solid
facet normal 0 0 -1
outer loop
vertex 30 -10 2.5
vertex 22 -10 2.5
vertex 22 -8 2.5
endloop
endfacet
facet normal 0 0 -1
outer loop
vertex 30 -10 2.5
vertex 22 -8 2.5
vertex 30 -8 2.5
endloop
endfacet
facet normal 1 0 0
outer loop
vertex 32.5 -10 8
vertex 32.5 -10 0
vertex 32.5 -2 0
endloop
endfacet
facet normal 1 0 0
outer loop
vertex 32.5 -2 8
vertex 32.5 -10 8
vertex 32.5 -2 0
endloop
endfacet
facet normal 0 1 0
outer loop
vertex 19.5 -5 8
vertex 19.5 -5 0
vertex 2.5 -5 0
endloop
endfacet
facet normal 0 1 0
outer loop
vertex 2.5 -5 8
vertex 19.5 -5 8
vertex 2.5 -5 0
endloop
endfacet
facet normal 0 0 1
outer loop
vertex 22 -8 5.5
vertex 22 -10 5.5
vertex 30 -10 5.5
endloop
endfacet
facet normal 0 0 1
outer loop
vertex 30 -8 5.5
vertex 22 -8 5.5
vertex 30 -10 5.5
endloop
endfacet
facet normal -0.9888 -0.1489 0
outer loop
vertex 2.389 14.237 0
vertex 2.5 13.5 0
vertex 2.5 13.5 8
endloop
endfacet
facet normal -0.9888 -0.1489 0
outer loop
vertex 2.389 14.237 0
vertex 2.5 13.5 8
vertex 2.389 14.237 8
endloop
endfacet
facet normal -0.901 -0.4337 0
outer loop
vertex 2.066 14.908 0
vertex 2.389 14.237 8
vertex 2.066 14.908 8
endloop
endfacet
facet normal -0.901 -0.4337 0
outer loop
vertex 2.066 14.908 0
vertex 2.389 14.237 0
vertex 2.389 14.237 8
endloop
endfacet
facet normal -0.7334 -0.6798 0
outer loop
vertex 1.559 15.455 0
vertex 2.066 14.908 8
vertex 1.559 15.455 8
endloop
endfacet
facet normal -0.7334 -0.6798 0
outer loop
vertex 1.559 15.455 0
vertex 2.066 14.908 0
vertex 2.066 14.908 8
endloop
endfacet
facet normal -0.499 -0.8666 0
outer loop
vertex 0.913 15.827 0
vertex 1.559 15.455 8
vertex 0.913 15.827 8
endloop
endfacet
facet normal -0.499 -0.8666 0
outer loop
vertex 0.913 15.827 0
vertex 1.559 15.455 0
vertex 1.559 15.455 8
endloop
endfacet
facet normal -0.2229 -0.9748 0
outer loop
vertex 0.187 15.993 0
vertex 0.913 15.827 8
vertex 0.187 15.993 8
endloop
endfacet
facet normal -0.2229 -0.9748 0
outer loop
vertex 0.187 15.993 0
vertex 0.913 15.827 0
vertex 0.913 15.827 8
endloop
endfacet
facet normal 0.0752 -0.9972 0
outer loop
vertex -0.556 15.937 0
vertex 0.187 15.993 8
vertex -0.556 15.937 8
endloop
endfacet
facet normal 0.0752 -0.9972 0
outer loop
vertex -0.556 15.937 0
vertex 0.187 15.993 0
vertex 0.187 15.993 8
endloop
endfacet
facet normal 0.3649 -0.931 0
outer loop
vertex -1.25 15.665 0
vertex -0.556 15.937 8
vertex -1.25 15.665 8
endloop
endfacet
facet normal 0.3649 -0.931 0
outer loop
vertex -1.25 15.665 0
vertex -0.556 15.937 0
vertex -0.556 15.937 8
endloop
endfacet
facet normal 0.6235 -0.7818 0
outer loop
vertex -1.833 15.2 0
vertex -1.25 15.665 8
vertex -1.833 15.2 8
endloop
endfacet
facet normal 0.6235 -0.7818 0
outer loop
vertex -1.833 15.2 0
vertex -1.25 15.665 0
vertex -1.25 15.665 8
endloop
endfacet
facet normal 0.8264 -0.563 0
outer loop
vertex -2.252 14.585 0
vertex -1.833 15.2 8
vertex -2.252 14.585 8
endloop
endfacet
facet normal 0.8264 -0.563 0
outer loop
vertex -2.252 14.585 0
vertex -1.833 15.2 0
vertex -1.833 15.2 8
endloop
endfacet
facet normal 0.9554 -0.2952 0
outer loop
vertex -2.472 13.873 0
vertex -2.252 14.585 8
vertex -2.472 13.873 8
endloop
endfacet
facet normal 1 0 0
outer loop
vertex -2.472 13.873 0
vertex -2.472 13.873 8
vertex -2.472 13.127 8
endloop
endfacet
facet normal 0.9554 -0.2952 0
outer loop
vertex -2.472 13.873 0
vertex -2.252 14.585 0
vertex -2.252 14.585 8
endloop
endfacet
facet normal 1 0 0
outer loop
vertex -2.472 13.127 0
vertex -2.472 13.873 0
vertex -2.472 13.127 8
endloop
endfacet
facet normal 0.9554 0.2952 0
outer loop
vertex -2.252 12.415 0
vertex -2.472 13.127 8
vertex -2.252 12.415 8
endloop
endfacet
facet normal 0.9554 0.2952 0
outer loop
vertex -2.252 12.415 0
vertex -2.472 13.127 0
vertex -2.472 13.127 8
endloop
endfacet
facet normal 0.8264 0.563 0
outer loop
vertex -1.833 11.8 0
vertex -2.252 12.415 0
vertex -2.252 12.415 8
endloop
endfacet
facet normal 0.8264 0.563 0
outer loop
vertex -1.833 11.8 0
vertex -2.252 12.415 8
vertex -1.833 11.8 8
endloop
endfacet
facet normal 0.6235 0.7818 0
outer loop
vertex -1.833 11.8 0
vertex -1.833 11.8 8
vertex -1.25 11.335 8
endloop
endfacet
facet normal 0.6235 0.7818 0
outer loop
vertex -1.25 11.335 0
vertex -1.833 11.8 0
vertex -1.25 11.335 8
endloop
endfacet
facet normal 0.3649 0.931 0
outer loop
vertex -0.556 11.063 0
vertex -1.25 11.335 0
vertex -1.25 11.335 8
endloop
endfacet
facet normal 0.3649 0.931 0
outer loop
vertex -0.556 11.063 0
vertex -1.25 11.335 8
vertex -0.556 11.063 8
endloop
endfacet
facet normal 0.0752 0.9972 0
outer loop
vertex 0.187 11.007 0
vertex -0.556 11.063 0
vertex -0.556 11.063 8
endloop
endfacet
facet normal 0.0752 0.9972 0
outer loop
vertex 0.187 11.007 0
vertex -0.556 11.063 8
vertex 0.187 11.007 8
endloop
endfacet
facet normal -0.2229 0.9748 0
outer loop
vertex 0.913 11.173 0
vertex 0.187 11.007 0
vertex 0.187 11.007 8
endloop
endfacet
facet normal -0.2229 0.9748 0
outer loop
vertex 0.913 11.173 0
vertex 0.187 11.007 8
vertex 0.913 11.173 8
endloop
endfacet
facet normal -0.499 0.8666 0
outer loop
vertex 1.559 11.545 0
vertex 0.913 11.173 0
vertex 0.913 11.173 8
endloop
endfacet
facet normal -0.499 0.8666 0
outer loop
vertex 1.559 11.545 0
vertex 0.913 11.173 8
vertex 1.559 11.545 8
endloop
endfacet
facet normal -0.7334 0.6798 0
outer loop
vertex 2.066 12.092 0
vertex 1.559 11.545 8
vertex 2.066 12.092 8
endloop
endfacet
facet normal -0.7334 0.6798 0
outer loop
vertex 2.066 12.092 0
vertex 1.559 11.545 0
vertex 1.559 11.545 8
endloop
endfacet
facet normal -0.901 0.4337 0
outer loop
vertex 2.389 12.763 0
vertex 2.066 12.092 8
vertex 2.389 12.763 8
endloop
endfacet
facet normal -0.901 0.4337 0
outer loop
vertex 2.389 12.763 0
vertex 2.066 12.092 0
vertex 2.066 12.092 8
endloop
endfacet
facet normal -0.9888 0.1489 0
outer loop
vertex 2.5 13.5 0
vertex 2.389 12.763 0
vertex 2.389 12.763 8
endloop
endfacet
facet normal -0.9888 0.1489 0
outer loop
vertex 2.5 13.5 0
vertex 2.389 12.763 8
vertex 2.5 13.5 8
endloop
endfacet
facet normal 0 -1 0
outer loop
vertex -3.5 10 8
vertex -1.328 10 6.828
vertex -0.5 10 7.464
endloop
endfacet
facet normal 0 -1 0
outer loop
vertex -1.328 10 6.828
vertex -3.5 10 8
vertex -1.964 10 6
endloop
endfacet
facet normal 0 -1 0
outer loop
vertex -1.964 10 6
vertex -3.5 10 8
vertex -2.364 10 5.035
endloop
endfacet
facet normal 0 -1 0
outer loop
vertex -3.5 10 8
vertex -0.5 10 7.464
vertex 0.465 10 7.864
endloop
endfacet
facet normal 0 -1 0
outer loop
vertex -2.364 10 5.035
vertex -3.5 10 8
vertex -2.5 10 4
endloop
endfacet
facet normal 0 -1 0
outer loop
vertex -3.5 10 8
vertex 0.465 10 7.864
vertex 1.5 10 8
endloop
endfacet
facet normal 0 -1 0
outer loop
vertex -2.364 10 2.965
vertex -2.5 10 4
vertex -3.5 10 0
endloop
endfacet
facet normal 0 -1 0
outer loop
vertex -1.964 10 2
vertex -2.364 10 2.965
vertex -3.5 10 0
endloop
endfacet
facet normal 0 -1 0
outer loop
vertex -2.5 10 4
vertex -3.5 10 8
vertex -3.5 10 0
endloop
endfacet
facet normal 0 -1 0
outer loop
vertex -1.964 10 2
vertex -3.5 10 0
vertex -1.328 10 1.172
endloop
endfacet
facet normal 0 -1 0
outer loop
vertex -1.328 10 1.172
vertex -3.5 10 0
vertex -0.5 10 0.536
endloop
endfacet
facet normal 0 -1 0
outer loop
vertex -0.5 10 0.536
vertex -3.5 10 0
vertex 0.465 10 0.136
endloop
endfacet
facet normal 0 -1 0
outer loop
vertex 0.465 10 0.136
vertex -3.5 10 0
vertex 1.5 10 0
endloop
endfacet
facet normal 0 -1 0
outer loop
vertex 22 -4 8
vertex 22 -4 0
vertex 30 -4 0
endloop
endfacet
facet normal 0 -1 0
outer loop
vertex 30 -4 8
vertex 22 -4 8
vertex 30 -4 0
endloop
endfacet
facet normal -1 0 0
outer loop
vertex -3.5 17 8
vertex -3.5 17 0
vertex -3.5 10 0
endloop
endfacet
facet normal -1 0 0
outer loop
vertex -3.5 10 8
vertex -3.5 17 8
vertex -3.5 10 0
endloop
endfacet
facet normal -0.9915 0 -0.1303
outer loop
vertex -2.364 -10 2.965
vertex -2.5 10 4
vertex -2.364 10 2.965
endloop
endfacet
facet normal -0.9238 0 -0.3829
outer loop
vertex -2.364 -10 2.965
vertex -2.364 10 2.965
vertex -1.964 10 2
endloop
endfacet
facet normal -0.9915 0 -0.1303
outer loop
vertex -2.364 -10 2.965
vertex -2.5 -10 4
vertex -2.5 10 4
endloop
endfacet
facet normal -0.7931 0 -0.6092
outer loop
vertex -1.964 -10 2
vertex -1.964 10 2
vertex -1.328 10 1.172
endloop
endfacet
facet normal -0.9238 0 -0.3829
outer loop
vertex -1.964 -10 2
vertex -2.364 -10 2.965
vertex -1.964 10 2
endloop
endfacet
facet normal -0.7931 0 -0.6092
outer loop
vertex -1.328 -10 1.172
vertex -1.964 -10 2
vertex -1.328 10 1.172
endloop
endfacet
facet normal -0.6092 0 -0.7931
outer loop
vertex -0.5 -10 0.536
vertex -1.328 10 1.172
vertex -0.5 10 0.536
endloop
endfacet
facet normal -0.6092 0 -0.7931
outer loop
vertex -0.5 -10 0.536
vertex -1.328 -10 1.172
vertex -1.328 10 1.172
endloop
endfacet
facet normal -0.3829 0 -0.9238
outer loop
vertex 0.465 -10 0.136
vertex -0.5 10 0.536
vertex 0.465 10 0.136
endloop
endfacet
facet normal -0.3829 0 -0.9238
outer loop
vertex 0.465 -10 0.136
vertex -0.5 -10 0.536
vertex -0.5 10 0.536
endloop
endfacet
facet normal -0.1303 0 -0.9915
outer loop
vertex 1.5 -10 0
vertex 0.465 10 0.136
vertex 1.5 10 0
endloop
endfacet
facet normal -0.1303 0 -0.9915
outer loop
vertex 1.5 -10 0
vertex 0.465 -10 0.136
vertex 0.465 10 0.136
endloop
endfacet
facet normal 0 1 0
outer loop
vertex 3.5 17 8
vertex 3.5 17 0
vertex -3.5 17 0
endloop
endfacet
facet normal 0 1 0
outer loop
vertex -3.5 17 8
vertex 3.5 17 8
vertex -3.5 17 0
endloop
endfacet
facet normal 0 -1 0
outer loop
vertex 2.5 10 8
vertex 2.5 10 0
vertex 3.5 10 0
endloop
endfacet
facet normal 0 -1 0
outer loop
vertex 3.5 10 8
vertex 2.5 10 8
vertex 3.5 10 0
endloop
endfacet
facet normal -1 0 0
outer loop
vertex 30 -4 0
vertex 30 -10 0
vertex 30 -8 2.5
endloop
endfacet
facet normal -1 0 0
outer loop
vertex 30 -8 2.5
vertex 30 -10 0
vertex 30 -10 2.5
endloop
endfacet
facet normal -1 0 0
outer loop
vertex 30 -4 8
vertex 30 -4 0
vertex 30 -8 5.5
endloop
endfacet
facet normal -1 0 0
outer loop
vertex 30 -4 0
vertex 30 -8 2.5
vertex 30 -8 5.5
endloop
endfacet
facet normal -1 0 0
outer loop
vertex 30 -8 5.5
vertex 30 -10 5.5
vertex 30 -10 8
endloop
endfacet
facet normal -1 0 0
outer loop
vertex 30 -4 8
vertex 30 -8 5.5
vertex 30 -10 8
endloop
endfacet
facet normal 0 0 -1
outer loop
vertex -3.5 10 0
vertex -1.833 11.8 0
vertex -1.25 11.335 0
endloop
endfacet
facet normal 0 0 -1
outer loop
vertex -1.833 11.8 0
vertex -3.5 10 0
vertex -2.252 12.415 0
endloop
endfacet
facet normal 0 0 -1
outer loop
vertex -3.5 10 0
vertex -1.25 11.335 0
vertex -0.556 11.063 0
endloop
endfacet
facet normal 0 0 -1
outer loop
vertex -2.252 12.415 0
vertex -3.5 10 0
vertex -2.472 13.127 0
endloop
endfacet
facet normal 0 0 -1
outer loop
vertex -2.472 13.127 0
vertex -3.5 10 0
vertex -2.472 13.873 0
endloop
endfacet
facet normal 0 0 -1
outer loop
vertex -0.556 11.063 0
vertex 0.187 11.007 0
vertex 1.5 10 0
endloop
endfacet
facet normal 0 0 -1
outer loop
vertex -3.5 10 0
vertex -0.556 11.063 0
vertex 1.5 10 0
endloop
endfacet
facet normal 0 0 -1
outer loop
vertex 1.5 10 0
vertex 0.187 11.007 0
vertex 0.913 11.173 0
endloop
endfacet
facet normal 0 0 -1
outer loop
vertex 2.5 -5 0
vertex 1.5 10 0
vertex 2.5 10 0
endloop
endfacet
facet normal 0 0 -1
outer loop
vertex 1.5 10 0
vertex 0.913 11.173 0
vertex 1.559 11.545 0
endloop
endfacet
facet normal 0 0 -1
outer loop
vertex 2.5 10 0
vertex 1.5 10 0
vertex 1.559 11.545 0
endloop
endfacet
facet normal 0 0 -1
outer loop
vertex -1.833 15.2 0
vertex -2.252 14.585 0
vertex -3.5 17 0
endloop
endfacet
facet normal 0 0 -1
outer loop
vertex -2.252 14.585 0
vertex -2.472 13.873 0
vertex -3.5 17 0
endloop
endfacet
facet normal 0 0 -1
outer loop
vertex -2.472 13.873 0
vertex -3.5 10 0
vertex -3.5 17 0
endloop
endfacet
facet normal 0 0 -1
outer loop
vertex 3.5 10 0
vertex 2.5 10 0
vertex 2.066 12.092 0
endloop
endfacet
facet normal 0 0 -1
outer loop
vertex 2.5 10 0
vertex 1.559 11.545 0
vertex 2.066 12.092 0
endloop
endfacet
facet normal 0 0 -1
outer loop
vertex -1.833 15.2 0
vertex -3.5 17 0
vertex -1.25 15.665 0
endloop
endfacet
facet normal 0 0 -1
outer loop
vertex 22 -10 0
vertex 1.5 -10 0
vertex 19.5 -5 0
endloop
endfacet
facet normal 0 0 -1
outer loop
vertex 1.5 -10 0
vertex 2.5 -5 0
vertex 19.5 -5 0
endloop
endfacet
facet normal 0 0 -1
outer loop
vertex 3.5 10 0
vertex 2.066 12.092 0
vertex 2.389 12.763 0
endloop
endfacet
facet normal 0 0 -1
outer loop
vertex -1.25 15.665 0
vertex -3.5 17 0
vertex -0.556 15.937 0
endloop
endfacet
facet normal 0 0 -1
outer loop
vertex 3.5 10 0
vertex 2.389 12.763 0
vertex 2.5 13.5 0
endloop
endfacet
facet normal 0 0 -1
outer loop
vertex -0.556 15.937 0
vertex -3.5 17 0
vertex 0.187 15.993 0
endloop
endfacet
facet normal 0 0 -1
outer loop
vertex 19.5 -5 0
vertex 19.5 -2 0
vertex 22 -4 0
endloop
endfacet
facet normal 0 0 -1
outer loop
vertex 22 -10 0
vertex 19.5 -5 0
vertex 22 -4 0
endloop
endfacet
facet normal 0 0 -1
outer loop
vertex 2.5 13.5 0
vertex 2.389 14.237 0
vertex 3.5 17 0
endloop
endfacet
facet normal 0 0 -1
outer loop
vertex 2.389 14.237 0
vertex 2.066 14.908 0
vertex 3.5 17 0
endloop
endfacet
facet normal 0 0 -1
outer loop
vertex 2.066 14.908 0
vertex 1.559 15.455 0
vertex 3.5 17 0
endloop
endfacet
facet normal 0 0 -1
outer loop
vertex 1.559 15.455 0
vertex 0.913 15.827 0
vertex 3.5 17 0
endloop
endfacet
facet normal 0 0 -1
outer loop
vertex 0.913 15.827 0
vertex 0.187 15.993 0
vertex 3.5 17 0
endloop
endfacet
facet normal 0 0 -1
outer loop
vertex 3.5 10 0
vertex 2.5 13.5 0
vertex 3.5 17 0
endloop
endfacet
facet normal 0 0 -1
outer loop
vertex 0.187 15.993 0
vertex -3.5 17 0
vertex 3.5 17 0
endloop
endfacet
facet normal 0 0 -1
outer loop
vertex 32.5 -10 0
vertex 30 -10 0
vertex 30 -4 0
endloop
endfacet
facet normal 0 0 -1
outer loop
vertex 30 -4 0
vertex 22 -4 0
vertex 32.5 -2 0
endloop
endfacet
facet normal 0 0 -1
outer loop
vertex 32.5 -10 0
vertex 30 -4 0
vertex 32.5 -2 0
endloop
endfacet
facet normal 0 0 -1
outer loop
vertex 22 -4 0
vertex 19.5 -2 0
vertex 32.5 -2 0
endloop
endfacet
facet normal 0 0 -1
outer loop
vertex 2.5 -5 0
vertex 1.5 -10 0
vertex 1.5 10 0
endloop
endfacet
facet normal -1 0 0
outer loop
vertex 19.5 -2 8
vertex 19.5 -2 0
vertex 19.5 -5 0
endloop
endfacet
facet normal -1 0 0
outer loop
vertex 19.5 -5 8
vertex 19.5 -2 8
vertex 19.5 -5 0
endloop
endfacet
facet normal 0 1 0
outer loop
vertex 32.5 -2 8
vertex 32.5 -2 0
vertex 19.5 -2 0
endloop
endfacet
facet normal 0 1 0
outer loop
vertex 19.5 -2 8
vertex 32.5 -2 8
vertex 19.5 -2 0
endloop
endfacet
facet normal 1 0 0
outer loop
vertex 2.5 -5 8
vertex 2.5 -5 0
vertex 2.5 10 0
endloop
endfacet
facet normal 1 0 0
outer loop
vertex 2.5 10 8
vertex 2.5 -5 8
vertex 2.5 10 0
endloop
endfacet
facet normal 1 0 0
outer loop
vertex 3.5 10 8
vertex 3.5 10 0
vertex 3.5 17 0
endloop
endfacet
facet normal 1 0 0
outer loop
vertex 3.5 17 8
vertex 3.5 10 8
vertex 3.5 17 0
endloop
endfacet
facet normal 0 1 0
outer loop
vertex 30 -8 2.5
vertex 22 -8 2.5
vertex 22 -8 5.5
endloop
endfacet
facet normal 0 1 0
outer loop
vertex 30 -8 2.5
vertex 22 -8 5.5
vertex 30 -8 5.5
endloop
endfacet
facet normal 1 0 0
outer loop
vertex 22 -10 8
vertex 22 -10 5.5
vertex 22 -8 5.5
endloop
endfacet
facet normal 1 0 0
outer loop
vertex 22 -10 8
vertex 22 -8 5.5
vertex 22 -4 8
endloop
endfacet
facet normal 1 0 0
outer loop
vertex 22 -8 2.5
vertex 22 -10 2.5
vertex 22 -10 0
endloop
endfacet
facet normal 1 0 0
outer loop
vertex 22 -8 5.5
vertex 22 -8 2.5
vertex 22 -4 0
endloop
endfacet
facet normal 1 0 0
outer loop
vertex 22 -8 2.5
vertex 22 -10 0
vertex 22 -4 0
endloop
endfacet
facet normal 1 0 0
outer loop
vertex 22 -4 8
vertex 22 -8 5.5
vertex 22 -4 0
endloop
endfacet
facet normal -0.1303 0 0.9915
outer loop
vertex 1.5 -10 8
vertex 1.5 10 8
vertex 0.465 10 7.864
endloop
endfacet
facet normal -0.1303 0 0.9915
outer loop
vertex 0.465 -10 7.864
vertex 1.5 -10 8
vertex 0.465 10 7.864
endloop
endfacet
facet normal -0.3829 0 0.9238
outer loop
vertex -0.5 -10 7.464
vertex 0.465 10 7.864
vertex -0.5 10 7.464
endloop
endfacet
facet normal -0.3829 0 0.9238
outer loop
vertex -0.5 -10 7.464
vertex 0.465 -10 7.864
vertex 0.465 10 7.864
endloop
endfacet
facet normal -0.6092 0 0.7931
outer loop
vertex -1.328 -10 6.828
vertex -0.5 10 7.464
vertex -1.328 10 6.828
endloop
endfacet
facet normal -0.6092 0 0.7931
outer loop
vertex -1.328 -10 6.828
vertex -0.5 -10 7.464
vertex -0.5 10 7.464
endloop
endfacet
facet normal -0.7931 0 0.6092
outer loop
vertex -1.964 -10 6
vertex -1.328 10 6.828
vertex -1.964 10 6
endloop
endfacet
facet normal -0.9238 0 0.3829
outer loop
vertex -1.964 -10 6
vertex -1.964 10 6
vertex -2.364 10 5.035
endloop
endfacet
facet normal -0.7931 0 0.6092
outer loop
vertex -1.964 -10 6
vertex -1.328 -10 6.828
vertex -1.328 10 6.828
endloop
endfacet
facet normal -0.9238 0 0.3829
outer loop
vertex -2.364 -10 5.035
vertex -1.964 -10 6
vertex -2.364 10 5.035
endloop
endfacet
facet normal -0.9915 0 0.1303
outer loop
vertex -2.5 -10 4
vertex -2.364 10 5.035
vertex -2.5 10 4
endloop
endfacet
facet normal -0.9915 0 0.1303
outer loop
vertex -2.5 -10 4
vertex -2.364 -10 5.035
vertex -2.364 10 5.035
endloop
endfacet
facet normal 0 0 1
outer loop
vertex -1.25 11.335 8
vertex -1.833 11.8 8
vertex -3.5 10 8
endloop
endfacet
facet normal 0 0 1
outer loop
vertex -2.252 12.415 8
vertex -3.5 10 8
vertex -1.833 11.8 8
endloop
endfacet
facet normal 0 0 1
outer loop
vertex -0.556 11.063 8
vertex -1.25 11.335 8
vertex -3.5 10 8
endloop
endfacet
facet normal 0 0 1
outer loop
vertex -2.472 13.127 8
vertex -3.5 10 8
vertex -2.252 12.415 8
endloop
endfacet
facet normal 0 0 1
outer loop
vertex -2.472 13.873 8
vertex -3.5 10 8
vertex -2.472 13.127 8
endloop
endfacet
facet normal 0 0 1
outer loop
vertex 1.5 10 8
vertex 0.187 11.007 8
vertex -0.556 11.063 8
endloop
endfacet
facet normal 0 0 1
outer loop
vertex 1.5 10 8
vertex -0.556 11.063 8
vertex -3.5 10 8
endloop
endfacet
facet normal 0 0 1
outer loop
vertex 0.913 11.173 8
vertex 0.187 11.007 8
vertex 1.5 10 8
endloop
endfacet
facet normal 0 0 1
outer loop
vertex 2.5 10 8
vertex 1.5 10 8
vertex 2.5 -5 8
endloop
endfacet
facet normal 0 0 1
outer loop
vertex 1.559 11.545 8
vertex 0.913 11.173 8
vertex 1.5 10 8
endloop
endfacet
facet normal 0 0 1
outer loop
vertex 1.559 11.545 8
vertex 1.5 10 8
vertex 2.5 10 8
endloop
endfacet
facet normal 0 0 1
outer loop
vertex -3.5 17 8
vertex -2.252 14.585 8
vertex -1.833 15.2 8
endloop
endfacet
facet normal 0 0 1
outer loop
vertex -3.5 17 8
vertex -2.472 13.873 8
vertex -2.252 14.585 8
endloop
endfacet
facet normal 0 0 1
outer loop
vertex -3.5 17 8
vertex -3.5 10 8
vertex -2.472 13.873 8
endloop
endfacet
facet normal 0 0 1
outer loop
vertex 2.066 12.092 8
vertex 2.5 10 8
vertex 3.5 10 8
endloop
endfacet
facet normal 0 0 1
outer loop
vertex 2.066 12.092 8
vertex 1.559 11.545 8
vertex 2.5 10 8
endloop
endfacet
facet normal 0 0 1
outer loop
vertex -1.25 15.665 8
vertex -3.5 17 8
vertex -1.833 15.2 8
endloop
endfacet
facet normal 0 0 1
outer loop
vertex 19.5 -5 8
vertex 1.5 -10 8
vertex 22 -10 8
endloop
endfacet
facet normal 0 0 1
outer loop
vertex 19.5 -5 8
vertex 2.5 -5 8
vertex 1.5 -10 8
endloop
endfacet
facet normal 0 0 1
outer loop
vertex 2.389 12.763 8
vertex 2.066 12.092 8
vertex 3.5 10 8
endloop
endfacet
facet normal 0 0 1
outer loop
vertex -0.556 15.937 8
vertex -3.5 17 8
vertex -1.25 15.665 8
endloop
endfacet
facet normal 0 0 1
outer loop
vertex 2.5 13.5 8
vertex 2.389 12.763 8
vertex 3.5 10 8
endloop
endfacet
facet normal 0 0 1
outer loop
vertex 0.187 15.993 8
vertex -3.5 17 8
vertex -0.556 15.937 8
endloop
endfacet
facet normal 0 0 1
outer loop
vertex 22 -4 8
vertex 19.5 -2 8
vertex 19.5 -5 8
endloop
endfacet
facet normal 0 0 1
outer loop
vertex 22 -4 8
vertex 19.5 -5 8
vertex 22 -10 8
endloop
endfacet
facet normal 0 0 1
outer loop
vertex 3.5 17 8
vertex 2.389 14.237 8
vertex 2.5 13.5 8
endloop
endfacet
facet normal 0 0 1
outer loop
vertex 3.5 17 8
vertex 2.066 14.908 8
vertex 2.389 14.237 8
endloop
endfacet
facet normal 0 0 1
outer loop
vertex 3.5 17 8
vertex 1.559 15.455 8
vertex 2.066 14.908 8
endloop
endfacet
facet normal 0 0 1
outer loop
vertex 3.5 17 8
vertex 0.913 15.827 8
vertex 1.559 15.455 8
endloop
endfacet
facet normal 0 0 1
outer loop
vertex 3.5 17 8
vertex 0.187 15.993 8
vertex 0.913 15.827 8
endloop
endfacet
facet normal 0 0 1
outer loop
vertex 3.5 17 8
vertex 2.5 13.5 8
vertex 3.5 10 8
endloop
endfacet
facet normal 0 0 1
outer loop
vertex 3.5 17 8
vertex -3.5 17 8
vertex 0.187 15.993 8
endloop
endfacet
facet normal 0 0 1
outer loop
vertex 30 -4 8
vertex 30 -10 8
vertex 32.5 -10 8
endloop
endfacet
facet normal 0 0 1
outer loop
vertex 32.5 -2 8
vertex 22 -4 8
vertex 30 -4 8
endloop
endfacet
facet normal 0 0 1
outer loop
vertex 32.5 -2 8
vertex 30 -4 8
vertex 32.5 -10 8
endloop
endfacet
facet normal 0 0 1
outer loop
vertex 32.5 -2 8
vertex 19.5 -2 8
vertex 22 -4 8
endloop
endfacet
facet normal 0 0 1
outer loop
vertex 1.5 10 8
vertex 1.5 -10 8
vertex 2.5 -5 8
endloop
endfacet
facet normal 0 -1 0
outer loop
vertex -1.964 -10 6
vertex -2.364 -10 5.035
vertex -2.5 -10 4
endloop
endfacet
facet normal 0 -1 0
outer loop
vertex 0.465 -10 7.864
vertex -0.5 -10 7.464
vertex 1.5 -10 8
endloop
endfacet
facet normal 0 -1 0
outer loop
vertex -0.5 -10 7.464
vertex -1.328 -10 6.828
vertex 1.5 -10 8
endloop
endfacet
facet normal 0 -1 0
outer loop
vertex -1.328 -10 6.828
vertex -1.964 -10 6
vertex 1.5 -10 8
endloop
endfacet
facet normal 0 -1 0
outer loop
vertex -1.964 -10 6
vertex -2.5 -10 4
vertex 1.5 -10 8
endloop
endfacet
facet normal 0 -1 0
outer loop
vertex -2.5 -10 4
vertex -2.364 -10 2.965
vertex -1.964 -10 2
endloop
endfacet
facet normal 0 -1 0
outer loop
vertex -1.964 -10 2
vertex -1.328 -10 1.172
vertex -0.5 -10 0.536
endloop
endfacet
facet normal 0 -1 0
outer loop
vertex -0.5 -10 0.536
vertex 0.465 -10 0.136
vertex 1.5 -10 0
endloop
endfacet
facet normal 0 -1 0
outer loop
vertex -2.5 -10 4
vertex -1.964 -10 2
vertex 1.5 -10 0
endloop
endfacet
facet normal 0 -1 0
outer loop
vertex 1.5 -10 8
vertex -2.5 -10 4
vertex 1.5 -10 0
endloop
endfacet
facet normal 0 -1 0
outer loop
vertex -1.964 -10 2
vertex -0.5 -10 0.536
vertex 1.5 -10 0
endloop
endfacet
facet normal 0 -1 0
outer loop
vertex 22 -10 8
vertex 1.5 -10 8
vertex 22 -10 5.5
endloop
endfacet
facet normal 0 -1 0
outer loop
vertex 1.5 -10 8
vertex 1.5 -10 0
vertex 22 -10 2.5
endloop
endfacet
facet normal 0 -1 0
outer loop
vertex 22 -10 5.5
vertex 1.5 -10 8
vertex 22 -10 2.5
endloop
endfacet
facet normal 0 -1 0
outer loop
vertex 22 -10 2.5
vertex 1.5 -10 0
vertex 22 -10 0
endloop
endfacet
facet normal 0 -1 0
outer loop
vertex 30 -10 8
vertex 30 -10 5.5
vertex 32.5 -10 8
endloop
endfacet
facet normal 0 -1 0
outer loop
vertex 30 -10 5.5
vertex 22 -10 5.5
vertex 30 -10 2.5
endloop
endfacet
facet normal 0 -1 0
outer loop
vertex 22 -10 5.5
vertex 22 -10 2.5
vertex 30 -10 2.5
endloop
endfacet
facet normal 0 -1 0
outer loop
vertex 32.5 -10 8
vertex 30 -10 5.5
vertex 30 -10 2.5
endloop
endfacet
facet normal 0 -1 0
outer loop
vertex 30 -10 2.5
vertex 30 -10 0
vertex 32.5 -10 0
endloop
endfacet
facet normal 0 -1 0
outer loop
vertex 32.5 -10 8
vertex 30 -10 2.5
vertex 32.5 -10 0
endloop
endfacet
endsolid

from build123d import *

# Parameters (mm, degrees)
F0_R     = 2.5
F0_W     = 8
F0_H     = 2
F1_DEPTH = 8
F2_W     = 8
F2_H     = 2.5
F3_DEPTH = 3
F4_R     = 3.99999


# Not quite as in the source:
# - a fillet or chamfer is up to 0.001 mm smaller than in the source, because OpenCascade refuses the exact size


with BuildPart() as f1:
    # F0 (on Top) → F1 (new body)
    with BuildSketch(Plane.XY):
        Polygon((-3.5, 10), (-2.5, 10), (2.5, 10), (3.5, 10), (3.5, 17), (-3.5, 17), align=None)
        with Locations((0, 13.5)):
            Circle(F0_R, mode=Mode.SUBTRACT)
        Polygon((-2.5, -10), (2.5, -10), (2.5, -5), (2.5, 10), (-2.5, 10), align=None)
        Polygon((2.5, -5), (2.5, -10), (22, -10), (22, -8), (22, -5), (19.5, -5), align=None)
        with Locations((26, -9)):
            Rectangle(F0_W, F0_H)
        Polygon((30, -8), (30, -10), (32.5, -10), (32.5, -5), (30, -5), align=None)
        Polygon((19.5, -4), (19.5, -5), (22, -5), (22, -4), (30, -4), (30, -5), (32.5, -5), (32.5, -2), (19.5, -2), align=None)
    extrude(amount=F1_DEPTH)

    # F2 (on face) → F3 (cut)
    with BuildSketch(Plane.XZ.offset(10)):
        with Locations((26, 6.75)):
            Rectangle(F2_W, F2_H)
        with Locations((26, 1.25)):
            Rectangle(F2_W, F2_H)
    extrude(amount=-F3_DEPTH, mode=Mode.SUBTRACT)

    # F4 (radius 4 in the source; OpenCascade refuses exactly that, so slightly less here)
    f4_edges = [f1.edges().sort_by_distance(p)[0] for p in [
        (-2.5, 0, 8),
        (-2.5, 0, 0),
    ]]
    fillet(f4_edges, radius=F4_R)


solid = f1.part
